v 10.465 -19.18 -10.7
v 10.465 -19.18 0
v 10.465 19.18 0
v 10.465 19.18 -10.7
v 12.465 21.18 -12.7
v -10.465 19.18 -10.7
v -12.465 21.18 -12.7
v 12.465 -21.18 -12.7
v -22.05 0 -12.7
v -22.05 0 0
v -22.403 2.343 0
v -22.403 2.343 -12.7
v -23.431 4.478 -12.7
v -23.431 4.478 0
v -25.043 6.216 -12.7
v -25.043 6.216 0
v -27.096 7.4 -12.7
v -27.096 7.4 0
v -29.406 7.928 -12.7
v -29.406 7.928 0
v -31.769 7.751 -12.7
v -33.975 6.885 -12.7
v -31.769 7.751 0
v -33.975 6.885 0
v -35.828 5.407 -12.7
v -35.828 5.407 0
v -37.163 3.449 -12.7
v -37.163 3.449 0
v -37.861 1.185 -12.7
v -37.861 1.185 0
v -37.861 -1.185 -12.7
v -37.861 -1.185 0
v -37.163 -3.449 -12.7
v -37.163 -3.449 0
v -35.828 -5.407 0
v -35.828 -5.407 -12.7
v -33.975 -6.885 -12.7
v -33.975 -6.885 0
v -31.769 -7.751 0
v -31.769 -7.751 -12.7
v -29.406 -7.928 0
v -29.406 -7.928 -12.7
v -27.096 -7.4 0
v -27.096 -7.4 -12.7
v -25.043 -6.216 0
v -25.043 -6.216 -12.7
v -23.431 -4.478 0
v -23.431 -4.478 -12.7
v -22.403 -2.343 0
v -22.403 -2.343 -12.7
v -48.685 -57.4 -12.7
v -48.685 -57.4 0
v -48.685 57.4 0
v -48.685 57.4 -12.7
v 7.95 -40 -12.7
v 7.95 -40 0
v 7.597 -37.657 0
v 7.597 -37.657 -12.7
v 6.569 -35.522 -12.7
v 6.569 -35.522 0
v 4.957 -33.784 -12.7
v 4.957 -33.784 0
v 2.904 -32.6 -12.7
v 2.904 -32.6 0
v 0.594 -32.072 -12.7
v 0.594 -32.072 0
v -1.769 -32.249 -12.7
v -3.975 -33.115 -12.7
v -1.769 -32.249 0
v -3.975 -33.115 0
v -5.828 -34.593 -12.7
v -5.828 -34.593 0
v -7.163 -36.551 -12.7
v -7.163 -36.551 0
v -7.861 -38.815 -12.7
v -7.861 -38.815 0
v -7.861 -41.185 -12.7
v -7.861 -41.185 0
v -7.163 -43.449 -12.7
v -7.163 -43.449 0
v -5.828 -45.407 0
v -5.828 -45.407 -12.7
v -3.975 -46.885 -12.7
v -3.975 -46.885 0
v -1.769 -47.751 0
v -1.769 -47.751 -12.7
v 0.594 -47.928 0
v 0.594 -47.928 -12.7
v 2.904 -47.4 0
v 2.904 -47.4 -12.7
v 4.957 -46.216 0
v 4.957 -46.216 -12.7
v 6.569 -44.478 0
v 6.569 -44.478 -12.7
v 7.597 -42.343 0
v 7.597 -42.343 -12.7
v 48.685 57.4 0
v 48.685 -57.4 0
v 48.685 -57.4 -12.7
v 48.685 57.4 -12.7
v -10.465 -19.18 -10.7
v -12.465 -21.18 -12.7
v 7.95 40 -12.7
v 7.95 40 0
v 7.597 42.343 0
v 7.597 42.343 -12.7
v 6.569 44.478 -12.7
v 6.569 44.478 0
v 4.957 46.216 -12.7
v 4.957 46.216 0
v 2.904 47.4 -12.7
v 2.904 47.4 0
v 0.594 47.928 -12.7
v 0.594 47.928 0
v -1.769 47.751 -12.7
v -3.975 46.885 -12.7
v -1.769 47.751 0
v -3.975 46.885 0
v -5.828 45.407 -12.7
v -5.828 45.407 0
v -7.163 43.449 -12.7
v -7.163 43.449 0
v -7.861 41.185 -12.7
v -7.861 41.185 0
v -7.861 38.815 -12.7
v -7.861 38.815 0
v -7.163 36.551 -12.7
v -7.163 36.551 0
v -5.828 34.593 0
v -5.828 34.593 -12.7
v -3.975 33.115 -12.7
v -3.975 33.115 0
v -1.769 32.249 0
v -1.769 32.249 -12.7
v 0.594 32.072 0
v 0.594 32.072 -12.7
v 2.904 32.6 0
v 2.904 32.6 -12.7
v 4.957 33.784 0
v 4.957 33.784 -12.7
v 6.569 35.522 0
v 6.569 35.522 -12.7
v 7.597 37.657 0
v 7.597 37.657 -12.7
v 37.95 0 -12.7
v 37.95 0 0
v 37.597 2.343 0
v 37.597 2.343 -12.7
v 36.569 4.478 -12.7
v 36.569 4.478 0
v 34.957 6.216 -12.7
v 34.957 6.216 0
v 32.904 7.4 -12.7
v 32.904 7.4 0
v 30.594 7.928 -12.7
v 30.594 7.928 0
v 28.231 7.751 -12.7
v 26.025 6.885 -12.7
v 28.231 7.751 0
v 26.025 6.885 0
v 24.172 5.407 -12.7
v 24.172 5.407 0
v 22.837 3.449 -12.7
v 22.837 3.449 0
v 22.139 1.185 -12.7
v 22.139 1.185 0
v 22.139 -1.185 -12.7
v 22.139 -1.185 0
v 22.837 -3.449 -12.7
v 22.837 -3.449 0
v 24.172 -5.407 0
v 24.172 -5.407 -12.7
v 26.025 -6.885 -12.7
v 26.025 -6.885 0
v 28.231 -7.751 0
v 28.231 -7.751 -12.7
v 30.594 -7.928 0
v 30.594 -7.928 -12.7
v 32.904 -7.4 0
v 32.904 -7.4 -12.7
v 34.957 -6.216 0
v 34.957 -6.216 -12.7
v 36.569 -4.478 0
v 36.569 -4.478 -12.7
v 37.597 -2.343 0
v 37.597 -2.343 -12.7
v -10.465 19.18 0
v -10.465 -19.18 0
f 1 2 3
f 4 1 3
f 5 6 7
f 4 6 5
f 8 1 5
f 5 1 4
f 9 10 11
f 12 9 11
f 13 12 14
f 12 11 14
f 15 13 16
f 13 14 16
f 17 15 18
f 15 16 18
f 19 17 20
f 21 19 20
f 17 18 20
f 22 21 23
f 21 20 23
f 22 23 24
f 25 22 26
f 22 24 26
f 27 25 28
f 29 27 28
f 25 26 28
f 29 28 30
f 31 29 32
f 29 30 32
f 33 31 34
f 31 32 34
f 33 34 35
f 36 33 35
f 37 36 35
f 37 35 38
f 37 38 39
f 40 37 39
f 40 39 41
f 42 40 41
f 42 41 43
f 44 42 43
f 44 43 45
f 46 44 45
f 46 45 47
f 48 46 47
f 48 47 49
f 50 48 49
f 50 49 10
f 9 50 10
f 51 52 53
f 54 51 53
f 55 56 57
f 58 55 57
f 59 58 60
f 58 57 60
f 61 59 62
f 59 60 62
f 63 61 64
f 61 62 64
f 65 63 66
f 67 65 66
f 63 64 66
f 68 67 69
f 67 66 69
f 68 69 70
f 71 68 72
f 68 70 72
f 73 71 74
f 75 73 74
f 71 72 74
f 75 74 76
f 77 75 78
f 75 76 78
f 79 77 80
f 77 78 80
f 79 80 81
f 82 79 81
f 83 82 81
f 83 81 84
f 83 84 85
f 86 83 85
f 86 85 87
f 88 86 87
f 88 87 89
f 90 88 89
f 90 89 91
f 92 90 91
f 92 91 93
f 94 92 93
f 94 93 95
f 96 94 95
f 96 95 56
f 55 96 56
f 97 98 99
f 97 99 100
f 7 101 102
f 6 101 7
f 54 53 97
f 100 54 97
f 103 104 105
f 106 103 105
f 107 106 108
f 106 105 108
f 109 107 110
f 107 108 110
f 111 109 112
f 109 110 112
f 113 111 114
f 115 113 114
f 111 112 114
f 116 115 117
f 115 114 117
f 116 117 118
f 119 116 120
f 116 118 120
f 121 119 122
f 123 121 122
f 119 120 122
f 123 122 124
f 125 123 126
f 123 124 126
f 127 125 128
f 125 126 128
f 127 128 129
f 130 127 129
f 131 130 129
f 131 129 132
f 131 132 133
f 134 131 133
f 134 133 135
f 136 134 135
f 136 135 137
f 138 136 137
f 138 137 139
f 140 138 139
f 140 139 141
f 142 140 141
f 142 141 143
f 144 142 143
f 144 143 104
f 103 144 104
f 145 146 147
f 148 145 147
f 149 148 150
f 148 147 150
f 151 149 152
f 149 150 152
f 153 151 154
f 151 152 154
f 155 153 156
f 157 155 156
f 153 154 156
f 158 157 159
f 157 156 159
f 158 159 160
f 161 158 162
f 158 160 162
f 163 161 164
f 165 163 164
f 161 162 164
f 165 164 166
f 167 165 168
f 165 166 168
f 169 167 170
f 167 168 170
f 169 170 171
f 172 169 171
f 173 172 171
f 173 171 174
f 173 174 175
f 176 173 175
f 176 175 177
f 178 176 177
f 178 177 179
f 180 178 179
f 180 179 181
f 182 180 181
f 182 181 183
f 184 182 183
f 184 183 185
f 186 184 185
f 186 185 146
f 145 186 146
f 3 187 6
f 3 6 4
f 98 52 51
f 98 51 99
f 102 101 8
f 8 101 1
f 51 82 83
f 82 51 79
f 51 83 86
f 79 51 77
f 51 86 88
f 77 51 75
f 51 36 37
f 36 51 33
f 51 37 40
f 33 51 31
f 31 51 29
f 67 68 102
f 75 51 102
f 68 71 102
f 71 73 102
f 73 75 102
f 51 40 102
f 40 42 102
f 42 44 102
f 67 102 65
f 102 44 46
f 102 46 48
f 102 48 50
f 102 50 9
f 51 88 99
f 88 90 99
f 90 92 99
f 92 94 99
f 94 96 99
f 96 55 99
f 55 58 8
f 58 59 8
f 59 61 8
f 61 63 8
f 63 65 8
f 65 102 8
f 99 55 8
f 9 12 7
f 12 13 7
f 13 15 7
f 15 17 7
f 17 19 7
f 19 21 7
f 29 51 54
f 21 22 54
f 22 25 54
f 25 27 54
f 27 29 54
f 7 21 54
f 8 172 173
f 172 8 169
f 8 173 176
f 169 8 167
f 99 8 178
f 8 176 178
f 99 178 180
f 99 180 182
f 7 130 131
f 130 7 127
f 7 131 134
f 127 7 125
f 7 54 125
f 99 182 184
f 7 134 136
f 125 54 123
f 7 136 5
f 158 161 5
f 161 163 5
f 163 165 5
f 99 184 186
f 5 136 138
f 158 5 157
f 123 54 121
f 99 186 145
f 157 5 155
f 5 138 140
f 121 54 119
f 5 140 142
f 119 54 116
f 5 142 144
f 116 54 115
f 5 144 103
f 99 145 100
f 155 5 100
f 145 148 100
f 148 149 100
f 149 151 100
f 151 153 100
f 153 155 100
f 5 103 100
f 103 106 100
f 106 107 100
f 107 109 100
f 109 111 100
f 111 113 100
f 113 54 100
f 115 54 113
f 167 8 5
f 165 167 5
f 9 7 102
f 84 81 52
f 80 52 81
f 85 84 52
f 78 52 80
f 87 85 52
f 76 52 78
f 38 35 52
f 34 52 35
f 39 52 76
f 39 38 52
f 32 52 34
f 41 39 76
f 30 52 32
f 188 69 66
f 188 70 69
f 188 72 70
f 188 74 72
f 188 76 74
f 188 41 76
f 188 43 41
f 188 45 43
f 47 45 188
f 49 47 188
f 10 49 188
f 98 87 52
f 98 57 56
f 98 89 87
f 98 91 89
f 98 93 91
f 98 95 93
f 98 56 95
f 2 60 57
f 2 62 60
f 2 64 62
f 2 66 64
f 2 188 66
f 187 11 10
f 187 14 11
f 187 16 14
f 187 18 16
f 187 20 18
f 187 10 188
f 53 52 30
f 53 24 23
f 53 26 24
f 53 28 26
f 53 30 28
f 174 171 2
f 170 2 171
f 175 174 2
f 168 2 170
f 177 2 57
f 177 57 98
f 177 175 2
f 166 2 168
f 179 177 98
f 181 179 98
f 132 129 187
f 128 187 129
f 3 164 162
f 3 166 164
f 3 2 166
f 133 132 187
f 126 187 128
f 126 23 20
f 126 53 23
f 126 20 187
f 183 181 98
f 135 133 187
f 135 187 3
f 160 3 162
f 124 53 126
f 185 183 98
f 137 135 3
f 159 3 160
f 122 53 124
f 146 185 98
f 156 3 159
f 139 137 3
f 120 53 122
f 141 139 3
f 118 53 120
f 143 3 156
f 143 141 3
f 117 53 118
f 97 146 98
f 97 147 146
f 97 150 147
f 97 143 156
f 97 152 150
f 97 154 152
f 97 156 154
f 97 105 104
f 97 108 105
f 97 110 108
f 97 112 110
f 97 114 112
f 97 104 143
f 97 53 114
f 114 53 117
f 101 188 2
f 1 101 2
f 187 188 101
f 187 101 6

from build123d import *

# Parameters (mm, degrees)
F0_W     = 97.37
F0_H     = 114.8
F1_DEPTH = 12.7
F2_W     = 20.93
F2_H     = 38.36
F3_DEPTH = 12.701
F4_SIZE  = 2
F5_R     = 7.95
F6_DEPTH = 12.701


with BuildPart() as f1:
    # F0 (on Top) → F1 (new body)
    with BuildSketch(Plane.XY):
        Rectangle(F0_W, F0_H)
    extrude(amount=-F1_DEPTH)

    # F2 (on face) → F3 (cut, through all)
    with BuildSketch(Plane.XY):
        Rectangle(F2_W, F2_H)
    extrude(amount=-F3_DEPTH, mode=Mode.SUBTRACT)

    # F4
    f4_edges = [f1.edges().sort_by_distance(p)[0] for p in [
        (0, 19.18, -12.7),
        (10.465, 0, -12.7),
        (-10.465, 0, -12.7),
        (0, -19.18, -12.7),
    ]]
    chamfer(f4_edges, length=F4_SIZE)

    # F5 (on face) → F6 (cut, through all)
    with BuildSketch(Plane.XY):
        with Locations((0, 40)):
            Circle(F5_R)
        with Locations((30, 0)):
            Circle(F5_R)
        with Locations((-30, 0)):
            Circle(F5_R)
        with Locations((0, -40)):
            Circle(F5_R)
    extrude(amount=-F6_DEPTH, mode=Mode.SUBTRACT)


solid = f1.part
